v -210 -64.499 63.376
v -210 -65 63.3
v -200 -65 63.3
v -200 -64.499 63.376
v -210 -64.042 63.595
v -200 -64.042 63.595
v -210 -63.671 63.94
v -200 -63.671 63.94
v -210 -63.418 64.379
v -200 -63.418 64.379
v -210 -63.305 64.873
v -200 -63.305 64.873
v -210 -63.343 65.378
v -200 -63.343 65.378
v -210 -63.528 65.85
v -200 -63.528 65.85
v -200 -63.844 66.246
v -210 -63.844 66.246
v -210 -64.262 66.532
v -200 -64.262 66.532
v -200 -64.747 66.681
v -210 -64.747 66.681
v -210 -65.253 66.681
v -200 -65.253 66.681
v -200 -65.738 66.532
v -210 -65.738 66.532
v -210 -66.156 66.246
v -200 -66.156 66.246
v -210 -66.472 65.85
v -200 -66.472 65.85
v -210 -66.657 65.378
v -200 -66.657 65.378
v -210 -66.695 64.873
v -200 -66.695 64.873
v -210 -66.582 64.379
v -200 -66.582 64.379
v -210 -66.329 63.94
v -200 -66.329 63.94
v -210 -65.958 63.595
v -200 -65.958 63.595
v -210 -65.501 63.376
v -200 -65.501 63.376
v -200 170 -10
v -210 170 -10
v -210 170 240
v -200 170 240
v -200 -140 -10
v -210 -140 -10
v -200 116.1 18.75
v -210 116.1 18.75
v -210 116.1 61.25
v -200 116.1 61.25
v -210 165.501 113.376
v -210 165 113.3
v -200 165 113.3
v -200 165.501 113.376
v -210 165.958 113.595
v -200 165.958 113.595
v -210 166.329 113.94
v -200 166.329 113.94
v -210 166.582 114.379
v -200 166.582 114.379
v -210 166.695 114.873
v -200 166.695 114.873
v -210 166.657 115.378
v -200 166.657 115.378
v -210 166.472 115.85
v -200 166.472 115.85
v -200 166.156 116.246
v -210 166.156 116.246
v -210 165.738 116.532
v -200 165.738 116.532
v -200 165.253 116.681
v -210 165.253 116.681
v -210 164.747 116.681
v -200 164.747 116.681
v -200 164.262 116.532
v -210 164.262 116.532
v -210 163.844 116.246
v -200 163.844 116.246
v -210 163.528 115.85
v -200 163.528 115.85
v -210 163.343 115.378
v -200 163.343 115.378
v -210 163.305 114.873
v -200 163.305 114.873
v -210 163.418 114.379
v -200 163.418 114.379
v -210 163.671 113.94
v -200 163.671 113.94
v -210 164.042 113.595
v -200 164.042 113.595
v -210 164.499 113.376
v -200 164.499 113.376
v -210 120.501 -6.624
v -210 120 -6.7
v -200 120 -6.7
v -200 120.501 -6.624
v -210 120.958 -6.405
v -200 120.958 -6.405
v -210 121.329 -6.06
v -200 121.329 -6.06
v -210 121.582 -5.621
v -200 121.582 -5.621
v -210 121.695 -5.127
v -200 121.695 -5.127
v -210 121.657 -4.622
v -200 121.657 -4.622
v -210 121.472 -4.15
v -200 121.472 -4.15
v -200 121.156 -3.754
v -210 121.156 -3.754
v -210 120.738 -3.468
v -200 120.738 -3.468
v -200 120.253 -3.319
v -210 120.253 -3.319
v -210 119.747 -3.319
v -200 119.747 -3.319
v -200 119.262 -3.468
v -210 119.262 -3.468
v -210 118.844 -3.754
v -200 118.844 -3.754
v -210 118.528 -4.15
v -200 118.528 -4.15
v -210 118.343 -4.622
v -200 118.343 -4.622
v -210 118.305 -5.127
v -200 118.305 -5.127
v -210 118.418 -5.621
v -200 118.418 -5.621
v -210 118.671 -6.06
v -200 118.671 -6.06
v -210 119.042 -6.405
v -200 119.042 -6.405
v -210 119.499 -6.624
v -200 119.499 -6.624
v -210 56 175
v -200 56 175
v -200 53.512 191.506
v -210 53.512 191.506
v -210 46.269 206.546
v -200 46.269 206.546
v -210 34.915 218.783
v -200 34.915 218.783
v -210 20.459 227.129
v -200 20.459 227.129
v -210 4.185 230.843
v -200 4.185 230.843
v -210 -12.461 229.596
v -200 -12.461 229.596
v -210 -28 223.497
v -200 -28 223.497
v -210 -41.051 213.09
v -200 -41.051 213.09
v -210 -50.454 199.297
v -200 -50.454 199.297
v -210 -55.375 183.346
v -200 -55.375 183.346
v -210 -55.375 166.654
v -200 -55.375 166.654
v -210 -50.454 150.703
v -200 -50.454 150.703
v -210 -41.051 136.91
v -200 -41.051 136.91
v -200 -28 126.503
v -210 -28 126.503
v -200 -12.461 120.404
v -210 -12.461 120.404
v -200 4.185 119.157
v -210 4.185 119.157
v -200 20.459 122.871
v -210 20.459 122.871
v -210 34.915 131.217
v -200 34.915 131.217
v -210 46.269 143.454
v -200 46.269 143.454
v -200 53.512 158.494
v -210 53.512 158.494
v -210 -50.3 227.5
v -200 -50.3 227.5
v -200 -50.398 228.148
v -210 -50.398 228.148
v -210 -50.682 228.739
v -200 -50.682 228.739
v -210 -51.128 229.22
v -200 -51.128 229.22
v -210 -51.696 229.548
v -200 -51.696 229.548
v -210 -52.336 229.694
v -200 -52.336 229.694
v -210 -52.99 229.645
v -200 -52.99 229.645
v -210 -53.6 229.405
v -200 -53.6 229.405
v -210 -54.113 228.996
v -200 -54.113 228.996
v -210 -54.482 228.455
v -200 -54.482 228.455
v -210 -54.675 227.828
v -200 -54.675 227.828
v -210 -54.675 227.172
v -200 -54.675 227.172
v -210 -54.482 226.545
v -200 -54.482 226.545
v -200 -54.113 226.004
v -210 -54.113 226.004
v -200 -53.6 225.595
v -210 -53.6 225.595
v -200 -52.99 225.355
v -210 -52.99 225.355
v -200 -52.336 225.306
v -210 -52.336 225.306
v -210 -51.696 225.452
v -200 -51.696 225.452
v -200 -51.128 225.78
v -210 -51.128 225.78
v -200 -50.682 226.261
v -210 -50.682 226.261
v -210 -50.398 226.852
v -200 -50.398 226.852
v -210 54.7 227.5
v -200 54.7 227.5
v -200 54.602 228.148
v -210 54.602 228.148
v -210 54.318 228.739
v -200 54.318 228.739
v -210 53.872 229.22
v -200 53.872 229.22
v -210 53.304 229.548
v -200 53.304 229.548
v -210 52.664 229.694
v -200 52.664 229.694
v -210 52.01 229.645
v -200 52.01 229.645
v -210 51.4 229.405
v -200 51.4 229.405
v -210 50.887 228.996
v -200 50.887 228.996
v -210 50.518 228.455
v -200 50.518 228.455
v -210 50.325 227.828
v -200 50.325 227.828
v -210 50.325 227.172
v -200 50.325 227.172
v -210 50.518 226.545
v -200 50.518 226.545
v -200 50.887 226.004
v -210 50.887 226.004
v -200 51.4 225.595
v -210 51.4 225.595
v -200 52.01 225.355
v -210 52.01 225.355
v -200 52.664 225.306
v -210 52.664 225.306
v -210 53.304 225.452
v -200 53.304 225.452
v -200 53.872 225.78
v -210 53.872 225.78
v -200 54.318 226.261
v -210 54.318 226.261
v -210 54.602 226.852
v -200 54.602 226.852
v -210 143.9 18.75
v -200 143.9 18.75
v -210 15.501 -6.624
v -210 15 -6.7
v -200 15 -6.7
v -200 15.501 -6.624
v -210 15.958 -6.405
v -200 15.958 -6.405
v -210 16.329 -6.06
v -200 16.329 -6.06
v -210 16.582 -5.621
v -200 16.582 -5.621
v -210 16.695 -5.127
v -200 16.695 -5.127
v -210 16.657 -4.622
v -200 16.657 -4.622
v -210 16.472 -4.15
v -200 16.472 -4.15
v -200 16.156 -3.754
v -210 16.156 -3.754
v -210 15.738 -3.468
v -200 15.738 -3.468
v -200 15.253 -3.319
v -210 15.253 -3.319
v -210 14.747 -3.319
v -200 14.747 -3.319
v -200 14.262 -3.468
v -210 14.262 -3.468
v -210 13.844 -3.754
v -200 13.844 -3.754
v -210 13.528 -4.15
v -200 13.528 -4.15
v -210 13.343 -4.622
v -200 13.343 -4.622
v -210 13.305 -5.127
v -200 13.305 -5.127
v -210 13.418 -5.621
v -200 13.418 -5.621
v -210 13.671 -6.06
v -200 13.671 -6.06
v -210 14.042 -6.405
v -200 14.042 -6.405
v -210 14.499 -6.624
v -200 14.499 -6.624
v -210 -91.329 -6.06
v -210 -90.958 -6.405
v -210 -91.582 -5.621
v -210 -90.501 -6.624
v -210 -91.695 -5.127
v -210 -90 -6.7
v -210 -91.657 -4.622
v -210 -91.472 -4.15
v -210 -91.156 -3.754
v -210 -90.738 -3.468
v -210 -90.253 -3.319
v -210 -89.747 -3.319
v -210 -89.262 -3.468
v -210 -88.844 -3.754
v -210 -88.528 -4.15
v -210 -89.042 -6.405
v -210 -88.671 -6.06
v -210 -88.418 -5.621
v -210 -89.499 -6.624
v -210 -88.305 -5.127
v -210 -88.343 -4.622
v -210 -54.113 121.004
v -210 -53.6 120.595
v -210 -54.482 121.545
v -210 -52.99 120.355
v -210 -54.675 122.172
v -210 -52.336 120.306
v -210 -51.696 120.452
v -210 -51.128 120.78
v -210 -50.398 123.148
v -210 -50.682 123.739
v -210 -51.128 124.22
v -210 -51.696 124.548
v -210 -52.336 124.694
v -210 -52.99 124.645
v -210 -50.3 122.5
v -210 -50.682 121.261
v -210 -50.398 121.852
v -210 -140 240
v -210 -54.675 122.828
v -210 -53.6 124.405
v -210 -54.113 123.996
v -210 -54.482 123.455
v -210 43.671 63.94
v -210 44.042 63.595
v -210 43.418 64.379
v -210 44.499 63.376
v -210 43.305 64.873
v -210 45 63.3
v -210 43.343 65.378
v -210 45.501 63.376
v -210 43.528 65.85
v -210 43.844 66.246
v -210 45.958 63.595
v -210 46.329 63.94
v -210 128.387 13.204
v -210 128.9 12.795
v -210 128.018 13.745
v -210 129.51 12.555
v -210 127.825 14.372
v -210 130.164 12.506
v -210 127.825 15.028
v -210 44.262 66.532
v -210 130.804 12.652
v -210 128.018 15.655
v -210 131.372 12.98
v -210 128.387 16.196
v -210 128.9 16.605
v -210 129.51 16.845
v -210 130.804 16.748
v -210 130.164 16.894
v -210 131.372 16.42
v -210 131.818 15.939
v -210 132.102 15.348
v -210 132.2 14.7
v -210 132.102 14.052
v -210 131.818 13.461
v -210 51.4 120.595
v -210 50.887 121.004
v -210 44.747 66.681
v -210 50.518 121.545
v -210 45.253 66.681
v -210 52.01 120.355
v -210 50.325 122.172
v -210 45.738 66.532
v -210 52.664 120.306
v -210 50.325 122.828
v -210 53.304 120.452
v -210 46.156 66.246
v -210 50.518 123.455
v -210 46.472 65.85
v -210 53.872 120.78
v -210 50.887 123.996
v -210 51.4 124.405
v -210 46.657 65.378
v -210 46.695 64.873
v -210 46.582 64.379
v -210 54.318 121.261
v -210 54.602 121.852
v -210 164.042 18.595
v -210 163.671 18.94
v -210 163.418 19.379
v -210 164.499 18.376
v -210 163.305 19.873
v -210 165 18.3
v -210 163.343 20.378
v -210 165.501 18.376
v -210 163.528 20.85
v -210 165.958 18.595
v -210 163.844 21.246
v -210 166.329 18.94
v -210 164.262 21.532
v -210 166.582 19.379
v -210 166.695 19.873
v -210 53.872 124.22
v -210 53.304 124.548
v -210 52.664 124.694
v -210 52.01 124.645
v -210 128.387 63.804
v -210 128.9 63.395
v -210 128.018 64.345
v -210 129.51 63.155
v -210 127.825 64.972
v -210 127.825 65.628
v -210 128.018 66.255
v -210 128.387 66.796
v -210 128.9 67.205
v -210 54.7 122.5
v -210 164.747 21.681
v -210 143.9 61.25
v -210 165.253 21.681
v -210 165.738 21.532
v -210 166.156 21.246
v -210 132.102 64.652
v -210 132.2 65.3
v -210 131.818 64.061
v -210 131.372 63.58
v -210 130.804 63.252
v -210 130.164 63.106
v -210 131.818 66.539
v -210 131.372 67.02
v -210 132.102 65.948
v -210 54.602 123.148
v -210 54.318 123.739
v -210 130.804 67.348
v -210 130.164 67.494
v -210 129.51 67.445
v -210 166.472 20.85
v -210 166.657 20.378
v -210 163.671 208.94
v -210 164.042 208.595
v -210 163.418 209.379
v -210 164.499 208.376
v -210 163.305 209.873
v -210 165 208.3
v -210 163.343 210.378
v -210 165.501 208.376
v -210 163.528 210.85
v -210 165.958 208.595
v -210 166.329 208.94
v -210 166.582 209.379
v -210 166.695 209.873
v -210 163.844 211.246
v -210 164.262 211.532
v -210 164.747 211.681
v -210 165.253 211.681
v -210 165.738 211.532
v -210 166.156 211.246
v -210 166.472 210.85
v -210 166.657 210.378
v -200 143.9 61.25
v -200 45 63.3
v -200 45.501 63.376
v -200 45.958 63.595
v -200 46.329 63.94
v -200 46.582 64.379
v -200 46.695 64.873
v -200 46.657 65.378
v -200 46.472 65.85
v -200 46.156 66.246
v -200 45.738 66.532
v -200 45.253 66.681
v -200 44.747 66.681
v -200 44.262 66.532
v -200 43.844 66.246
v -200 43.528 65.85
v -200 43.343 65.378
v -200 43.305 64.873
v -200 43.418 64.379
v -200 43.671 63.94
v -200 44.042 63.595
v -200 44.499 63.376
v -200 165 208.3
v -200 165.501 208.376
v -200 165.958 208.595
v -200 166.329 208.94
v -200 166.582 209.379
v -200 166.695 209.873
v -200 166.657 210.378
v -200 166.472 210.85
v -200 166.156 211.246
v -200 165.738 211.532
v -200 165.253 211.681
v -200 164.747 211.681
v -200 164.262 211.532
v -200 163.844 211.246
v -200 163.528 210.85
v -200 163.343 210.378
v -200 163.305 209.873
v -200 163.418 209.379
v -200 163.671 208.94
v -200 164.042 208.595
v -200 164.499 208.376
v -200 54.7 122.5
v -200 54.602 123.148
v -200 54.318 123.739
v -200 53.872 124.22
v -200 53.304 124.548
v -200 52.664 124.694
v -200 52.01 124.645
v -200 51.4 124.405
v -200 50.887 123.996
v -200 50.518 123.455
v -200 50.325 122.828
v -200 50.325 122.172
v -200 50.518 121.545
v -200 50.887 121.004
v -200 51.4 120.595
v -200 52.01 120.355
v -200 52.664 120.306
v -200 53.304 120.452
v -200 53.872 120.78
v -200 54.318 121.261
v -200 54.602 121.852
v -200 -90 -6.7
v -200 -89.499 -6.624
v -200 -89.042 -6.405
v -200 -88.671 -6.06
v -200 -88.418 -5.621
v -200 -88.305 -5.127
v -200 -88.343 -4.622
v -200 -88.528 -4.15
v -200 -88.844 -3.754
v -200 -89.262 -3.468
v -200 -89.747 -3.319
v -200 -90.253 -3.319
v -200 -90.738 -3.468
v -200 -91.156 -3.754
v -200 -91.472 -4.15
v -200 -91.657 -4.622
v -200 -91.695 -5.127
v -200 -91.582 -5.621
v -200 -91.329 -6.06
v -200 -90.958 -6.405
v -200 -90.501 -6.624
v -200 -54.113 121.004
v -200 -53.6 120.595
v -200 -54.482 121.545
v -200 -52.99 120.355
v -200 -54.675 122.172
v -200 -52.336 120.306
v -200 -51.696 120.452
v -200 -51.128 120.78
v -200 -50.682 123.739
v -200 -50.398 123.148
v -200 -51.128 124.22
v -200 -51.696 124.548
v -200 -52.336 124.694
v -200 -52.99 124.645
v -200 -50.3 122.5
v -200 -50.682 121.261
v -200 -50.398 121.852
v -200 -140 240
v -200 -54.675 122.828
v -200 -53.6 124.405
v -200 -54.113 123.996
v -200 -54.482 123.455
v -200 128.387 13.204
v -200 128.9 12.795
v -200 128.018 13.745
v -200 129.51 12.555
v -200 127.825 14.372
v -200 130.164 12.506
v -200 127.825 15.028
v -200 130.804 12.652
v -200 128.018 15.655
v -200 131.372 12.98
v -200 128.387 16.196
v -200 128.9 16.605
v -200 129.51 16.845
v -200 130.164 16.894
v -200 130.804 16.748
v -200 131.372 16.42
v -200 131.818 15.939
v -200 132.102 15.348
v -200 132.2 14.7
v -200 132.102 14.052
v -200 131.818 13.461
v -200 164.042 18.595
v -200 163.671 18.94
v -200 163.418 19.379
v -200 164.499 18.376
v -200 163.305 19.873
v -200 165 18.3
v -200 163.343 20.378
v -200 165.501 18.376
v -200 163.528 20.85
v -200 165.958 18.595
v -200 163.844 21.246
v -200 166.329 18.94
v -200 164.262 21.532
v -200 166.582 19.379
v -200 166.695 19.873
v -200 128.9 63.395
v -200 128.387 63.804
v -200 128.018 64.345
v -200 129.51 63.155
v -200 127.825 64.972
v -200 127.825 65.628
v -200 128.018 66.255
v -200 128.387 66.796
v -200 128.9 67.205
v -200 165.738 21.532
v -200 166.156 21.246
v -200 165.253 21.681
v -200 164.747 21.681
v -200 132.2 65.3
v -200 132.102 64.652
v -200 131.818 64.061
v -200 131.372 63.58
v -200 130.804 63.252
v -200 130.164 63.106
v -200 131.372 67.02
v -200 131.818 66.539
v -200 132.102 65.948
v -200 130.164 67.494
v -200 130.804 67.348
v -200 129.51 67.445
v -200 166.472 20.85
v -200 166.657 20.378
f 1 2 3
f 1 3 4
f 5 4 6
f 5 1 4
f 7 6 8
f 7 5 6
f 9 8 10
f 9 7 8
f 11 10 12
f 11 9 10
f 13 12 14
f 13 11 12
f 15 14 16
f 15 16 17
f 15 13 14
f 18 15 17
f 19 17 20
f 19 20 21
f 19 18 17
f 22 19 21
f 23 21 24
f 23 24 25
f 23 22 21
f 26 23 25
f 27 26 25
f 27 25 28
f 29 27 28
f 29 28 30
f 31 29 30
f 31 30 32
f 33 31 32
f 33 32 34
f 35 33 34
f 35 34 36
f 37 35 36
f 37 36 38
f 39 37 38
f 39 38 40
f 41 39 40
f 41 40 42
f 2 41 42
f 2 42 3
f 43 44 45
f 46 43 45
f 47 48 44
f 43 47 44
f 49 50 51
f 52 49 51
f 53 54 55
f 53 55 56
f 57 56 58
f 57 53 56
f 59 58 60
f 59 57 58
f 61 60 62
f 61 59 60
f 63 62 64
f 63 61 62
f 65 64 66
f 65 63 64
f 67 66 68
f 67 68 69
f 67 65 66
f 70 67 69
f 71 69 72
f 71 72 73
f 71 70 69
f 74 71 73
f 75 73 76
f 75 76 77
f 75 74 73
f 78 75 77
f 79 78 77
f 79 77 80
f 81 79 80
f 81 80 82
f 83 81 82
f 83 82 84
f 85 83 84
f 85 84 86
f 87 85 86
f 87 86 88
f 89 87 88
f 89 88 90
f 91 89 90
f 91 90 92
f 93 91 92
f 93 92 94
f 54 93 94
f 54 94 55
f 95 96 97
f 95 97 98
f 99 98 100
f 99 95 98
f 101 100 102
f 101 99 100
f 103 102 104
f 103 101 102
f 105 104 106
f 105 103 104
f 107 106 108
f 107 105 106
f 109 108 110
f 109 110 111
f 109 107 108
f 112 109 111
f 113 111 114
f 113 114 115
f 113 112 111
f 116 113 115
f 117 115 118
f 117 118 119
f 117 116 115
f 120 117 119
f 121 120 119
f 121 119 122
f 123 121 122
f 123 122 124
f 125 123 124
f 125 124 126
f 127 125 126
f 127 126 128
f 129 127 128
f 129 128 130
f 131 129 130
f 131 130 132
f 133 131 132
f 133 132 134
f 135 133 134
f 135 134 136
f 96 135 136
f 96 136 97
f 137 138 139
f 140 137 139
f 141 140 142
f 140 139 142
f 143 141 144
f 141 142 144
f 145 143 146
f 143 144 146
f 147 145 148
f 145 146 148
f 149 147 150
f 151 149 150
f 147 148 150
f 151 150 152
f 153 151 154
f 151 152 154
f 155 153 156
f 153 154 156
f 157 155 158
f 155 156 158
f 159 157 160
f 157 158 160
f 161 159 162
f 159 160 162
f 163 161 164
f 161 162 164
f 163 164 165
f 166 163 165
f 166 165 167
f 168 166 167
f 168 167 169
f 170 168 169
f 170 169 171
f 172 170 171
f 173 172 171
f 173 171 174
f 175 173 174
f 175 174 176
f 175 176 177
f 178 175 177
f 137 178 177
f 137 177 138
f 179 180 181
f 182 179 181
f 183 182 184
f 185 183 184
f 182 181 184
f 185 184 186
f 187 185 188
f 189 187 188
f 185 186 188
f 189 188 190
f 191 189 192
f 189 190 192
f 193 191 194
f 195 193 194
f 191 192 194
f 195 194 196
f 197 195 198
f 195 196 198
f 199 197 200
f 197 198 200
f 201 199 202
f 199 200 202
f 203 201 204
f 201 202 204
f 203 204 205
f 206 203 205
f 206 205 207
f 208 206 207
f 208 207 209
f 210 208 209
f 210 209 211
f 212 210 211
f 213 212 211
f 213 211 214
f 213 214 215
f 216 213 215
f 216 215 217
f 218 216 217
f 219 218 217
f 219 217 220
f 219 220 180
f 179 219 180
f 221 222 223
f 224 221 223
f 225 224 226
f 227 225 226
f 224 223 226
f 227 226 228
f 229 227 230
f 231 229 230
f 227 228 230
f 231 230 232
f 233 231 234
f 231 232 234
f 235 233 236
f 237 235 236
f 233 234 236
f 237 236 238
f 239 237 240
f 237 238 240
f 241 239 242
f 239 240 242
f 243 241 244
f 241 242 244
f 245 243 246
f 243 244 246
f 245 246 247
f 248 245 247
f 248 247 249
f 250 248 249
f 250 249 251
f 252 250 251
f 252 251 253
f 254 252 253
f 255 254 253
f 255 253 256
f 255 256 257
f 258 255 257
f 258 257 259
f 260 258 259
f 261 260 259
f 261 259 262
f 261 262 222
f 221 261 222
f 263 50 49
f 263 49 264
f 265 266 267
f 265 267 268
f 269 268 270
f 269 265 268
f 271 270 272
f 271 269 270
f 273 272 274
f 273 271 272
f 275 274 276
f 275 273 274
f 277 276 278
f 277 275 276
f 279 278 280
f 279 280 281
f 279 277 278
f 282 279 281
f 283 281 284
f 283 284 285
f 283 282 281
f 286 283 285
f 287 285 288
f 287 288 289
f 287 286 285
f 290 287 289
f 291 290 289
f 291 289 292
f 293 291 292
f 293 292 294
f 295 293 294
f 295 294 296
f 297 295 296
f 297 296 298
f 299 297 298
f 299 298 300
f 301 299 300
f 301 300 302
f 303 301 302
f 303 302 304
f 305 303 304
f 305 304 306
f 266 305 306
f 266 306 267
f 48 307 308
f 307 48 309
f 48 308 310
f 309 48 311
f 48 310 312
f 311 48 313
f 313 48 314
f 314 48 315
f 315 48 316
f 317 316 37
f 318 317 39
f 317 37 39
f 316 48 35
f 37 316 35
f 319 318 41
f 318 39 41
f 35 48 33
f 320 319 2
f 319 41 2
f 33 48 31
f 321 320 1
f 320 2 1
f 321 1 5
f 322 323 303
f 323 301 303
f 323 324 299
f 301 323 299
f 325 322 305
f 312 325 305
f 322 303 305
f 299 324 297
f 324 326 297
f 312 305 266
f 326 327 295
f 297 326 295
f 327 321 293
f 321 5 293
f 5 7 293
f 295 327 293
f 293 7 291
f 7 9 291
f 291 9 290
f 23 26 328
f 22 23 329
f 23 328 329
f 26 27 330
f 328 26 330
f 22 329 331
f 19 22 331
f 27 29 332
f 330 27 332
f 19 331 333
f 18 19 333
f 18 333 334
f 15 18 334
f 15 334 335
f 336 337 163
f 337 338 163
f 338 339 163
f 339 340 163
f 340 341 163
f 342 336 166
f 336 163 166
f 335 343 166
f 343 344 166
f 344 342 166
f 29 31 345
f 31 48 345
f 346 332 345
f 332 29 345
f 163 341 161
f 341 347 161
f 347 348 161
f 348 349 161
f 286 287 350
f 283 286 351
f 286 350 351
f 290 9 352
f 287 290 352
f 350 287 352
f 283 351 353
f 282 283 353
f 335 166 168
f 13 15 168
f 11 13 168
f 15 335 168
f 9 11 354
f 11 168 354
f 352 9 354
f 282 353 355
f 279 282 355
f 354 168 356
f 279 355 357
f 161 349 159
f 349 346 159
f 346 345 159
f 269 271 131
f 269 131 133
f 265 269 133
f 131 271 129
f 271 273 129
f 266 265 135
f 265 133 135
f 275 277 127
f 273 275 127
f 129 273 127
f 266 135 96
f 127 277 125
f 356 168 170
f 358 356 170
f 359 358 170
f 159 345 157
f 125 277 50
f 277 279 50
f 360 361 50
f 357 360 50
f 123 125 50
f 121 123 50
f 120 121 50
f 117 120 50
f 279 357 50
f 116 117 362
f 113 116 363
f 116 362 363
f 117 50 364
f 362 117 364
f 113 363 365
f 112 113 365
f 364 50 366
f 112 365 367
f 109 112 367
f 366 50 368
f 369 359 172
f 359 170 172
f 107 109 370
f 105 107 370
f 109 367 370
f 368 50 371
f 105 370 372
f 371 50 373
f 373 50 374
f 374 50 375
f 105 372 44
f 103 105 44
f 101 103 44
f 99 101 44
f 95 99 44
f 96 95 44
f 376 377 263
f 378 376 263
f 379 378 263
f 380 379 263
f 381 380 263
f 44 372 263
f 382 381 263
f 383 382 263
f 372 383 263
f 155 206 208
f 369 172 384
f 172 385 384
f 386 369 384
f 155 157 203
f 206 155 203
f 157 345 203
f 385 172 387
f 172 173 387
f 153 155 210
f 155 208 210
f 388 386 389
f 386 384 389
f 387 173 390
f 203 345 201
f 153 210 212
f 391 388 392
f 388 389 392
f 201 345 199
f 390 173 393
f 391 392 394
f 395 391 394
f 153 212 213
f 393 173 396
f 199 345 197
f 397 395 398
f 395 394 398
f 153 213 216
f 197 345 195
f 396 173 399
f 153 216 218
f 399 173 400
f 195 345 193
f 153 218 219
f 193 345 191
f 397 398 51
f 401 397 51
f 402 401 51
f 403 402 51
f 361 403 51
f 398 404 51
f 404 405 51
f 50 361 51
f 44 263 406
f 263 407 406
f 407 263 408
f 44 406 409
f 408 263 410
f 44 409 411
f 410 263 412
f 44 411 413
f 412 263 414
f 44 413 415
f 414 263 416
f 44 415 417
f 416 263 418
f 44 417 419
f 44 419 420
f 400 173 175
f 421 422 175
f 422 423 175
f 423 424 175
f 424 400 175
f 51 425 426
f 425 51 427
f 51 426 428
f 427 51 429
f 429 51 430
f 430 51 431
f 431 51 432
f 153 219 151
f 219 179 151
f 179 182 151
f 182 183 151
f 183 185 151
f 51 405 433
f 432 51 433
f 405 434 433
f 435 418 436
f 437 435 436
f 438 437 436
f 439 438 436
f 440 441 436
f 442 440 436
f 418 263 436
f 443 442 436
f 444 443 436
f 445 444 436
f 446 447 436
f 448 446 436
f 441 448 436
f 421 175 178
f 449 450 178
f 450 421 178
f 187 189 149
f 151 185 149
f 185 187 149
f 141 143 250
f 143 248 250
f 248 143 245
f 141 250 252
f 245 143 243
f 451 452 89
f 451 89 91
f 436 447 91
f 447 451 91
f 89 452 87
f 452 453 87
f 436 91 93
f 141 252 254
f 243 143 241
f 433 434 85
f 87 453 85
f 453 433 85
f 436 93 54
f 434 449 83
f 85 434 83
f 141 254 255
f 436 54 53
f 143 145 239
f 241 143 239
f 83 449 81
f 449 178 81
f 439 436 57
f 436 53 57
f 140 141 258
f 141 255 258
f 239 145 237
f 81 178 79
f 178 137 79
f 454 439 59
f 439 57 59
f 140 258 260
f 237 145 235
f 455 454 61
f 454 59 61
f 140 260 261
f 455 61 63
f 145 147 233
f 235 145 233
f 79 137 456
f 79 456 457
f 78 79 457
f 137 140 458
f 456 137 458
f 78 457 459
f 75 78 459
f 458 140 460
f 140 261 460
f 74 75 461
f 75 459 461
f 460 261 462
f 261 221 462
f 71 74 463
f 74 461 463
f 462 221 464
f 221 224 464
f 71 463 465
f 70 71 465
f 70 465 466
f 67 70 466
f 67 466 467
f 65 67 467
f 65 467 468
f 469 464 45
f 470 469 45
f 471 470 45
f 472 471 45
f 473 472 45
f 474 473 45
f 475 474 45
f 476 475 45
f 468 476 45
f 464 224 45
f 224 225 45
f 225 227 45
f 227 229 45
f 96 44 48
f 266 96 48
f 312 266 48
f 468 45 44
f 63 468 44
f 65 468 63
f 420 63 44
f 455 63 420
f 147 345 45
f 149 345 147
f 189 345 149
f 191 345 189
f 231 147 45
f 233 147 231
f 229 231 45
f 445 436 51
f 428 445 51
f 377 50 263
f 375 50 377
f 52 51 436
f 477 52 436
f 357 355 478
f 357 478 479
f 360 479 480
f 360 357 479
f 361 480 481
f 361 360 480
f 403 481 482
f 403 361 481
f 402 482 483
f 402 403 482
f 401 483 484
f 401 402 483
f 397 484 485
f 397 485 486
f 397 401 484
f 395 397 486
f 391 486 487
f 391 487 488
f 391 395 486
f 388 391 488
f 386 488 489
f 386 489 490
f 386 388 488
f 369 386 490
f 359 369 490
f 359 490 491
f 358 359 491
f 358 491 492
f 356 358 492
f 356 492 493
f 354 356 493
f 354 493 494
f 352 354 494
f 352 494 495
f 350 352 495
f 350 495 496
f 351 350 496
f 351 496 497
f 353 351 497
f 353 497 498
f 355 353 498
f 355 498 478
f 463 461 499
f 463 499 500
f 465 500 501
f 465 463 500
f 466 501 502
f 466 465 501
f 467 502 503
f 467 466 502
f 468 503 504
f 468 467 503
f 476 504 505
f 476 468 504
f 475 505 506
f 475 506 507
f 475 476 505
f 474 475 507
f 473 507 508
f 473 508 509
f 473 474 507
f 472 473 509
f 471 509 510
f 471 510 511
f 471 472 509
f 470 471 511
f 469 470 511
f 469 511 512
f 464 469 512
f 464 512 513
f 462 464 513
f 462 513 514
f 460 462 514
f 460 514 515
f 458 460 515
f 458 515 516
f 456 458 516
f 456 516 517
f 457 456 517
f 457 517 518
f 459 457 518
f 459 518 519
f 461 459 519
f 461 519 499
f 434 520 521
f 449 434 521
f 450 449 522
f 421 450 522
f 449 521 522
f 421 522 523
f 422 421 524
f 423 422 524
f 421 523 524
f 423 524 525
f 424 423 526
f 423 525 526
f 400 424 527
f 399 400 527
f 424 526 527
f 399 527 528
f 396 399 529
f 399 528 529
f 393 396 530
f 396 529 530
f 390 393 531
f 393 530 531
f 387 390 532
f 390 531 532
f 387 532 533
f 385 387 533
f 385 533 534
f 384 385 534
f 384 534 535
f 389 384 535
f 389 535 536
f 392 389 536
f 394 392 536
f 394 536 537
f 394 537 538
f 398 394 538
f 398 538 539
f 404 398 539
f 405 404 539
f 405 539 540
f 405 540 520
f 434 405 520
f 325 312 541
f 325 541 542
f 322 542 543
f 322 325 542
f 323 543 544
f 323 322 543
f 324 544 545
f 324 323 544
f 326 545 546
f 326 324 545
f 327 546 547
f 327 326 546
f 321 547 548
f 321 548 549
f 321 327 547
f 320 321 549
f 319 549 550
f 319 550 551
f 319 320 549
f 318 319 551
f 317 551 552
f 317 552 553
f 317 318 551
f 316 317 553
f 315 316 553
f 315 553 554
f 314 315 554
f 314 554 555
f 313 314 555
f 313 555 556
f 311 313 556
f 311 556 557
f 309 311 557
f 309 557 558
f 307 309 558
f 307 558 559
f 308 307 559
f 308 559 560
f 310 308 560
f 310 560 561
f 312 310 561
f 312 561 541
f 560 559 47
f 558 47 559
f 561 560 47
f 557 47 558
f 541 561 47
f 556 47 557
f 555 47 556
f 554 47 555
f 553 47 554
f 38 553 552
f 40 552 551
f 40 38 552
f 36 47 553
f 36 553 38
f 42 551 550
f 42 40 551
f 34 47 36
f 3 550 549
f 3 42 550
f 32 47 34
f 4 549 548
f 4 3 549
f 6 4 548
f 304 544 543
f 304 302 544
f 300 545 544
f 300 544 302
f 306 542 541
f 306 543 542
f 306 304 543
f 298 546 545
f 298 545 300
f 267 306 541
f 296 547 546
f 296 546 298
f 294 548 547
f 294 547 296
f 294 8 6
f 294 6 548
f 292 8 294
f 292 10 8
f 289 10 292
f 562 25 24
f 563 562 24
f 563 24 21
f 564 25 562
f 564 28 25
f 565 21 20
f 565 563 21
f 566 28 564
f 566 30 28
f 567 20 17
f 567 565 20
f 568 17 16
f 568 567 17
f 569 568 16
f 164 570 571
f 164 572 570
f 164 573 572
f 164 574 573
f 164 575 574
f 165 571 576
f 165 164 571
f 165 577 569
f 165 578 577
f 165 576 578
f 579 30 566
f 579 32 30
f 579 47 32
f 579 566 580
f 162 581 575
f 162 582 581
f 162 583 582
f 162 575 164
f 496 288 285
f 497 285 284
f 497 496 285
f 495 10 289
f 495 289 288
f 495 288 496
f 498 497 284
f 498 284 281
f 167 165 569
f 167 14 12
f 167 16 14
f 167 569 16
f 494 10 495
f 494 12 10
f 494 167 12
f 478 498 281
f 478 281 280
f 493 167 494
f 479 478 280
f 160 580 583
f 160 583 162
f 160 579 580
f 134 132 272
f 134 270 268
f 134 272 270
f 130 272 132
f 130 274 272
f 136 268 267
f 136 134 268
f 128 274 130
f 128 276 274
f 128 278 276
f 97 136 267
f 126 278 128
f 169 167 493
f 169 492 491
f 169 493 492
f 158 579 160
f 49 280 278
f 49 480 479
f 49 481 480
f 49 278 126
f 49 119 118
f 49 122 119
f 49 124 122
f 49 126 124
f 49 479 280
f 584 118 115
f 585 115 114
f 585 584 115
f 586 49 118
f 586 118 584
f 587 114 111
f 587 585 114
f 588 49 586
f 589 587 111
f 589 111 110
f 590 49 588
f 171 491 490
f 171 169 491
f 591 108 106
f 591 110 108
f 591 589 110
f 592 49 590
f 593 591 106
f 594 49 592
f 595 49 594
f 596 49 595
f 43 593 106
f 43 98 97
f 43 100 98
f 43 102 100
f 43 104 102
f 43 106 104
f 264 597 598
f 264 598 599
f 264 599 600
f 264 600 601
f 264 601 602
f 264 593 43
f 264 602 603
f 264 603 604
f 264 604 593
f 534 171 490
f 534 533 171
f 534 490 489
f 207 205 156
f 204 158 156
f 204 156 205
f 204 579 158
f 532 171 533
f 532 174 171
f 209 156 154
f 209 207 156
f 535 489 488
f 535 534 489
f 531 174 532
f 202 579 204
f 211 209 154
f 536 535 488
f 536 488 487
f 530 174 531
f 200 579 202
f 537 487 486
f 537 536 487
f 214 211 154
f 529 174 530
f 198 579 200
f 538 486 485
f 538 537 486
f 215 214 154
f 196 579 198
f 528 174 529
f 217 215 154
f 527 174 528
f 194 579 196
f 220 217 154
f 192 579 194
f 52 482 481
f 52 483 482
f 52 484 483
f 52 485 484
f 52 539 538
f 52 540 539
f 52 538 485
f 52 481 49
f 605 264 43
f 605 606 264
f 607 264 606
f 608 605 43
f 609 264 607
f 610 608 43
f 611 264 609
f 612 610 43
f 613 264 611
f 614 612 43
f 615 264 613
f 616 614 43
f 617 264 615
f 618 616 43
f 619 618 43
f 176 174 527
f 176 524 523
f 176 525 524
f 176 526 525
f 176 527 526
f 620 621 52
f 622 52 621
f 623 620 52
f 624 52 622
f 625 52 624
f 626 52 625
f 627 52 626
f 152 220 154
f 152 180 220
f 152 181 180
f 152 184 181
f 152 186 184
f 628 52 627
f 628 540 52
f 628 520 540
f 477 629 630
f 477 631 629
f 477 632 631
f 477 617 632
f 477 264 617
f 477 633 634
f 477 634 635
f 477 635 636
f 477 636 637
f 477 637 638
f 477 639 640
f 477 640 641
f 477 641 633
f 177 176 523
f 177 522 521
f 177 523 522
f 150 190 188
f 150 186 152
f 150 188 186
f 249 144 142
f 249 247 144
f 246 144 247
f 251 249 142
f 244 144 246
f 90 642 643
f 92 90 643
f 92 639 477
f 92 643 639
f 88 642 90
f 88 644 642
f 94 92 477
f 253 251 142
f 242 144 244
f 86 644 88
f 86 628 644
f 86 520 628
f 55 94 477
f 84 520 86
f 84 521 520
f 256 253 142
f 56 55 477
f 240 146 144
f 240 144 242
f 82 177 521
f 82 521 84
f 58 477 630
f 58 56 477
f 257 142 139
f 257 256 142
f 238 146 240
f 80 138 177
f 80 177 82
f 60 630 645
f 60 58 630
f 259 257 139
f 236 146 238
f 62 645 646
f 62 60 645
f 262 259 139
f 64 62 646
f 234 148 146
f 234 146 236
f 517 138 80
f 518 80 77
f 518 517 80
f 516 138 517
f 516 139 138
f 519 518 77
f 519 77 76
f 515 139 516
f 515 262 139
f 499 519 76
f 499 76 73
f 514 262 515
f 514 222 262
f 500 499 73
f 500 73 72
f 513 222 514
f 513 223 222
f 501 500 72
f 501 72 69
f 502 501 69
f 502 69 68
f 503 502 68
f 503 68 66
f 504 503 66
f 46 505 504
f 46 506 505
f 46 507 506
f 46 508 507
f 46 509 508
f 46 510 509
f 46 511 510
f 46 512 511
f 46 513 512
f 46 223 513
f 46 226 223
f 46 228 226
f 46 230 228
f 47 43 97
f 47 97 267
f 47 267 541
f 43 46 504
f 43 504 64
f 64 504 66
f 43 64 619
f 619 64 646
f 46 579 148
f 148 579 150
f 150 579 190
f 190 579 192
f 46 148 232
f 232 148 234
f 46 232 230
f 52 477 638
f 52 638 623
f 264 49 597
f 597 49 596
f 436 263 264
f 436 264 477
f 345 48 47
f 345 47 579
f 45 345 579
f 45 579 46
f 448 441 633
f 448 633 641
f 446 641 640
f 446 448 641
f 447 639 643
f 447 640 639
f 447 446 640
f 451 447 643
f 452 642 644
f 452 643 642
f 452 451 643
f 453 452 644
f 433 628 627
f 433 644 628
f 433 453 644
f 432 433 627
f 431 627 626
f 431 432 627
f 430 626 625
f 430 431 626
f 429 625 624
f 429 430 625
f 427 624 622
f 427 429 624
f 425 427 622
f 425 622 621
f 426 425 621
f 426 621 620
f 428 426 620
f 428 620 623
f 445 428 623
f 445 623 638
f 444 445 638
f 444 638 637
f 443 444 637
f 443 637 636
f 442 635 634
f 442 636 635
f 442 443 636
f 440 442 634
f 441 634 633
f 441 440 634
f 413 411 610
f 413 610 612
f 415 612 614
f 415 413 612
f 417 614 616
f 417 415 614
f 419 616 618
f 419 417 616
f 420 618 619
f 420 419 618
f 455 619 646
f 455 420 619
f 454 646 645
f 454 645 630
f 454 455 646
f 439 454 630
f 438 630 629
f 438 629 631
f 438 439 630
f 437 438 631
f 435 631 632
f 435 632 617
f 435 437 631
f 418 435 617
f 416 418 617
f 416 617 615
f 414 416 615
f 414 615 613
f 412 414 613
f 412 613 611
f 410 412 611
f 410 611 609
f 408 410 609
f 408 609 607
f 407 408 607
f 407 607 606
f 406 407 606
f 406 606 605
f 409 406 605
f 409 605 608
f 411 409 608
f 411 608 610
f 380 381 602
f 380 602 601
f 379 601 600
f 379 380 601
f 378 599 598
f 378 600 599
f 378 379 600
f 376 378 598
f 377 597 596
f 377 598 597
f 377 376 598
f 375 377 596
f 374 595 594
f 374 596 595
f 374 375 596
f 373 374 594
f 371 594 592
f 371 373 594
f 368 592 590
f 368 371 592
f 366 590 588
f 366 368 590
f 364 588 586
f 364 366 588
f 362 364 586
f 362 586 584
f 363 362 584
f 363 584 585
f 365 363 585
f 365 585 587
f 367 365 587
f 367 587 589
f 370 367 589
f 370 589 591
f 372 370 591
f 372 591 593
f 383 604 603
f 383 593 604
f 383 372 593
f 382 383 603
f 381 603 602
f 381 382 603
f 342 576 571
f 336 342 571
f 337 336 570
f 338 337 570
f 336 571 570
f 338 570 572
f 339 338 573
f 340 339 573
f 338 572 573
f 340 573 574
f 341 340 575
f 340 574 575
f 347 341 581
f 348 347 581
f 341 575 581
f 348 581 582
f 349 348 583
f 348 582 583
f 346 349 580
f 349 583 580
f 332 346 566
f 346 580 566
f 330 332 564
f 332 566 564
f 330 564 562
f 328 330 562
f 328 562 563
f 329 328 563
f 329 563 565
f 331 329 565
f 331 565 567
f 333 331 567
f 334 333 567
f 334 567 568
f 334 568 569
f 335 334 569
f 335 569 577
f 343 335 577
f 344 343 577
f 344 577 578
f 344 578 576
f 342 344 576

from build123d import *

# Parameters (mm, degrees)
CYLINDER033_R           = 1.7
CYLINDER033_DEPTH       = 20
CYLINDER031_R           = 1.7
CYLINDER031_DEPTH       = 20
CYLINDER031_ROLL_ANGLE  = 90
CYLINDER028_R           = 1.7
CYLINDER028_DEPTH       = 20
CYLINDER028_ROLL_ANGLE  = 90
CYLINDER032_R           = 1.7
CYLINDER032_DEPTH       = 20
CYLINDER030_R           = 1.7
CYLINDER030_DEPTH       = 20
CYLINDER030_ROLL_ANGLE  = 90
CYLINDER029_R           = 1.7
CYLINDER029_DEPTH       = 20
CYLINDER024_R           = 1.7
CYLINDER024_DEPTH       = 20
CYLINDER024_PITCH_ANGLE = 90
CYLINDER025_R           = 1.7
CYLINDER025_DEPTH       = 20
CYLINDER025_PITCH_ANGLE = 90
CYLINDER026_R           = 1.7
CYLINDER026_DEPTH       = 20
CYLINDER026_PITCH_ANGLE = 90
CYLINDER027_R           = 1.7
CYLINDER027_DEPTH       = 20
CYLINDER027_PITCH_ANGLE = 90
CYLINDER023_R           = 1.7
CYLINDER023_DEPTH       = 20
CYLINDER023_PITCH_ANGLE = 90
CYLINDER022_R           = 1.7
CYLINDER022_DEPTH       = 20
CYLINDER022_PITCH_ANGLE = 90
CYLINDER020_R           = 1.7
CYLINDER020_DEPTH       = 20
CYLINDER020_PITCH_ANGLE = 90
CYLINDER019_R           = 1.7
CYLINDER019_DEPTH       = 20
CYLINDER019_PITCH_ANGLE = 90
SKETCH018_R             = 2.2
SKETCH018_R_2           = 56
PAD016_DEPTH            = 20
SKETCH012_R             = 2.2
SKETCH012_W             = 27.8
SKETCH012_H             = 42.5
PAD012_DEPTH            = 30
SKETCH006_W             = 310
SKETCH006_H             = 250
PAD006_DEPTH            = 10


with BuildPart() as cylinder033:
    # Cylinder033 → Cylinder033 (new body)
    with BuildSketch(Plane(origin=(-205, 120, 240), x_dir=(1, 0, 0), z_dir=(0, 0, 1))):
        Circle(CYLINDER033_R)
    extrude(amount=CYLINDER033_DEPTH)


with BuildPart() as cylinder031:
    # Cylinder031 → Cylinder031 (new body)
    with BuildSketch(Plane.XY):
        Circle(CYLINDER031_R)
    extrude(amount=CYLINDER031_DEPTH)


with BuildPart() as cylinder031_1:
    # Cylinder031 roll: moved
    add(cylinder031.part.rotate(Axis((0, 0, 0), (1, 0, 0)), CYLINDER031_ROLL_ANGLE))


with BuildPart() as cylinder031_2:
    # Cylinder031 placement: moved
    add(cylinder031_1.part.moved(Location((-205, -140, 210))))


with BuildPart() as cylinder028:
    # Cylinder028 → Cylinder028 (new body)
    with BuildSketch(Plane.XY):
        Circle(CYLINDER028_R)
    extrude(amount=CYLINDER028_DEPTH)


with BuildPart() as cylinder028_1:
    # Cylinder028 roll: moved
    add(cylinder028.part.rotate(Axis((0, 0, 0), (1, 0, 0)), CYLINDER028_ROLL_ANGLE))


with BuildPart() as cylinder028_2:
    # Cylinder028 placement: moved
    add(cylinder028_1.part.moved(Location((-205, -140, 20))))


with BuildPart() as cylinder032:
    # Cylinder032 → Cylinder032 (new body)
    with BuildSketch(Plane(origin=(-205, 15, 240), x_dir=(1, 0, 0), z_dir=(0, 0, 1))):
        Circle(CYLINDER032_R)
    extrude(amount=CYLINDER032_DEPTH)


with BuildPart() as cylinder030:
    # Cylinder030 → Cylinder030 (new body)
    with BuildSketch(Plane.XY):
        Circle(CYLINDER030_R)
    extrude(amount=CYLINDER030_DEPTH)


with BuildPart() as cylinder030_1:
    # Cylinder030 roll: moved
    add(cylinder030.part.rotate(Axis((0, 0, 0), (1, 0, 0)), CYLINDER030_ROLL_ANGLE))


with BuildPart() as cylinder030_2:
    # Cylinder030 placement: moved
    add(cylinder030_1.part.moved(Location((-205, -140, 115))))


with BuildPart() as fusion006:
    # Cylinder029 → Cylinder029 (new body)
    with BuildSketch(Plane(origin=(-205, -90, 240), x_dir=(1, 0, 0), z_dir=(0, 0, 1))):
        Circle(CYLINDER029_R)
    extrude(amount=CYLINDER029_DEPTH)

    # Fusion006: union Cylinder033, Cylinder031, Cylinder028, Cylinder032, Cylinder030
    add(cylinder033.part)
    add(cylinder031_2.part)
    add(cylinder028_2.part)
    add(cylinder032.part)
    add(cylinder030_2.part)


with BuildPart() as cylinder024:
    # Cylinder024 → Cylinder024 (new body)
    with BuildSketch(Plane.XY):
        Circle(CYLINDER024_R)
    extrude(amount=CYLINDER024_DEPTH)


with BuildPart() as cylinder024_1:
    # Cylinder024 pitch: moved
    add(cylinder024.part.rotate(Axis((0, 0, 0), (0, 1, 0)), CYLINDER024_PITCH_ANGLE))


with BuildPart() as cylinder024_2:
    # Cylinder024 placement: moved
    add(cylinder024_1.part.moved(Location((-220, 120, -5))))


with BuildPart() as cylinder025:
    # Cylinder025 → Cylinder025 (new body)
    with BuildSketch(Plane.XY):
        Circle(CYLINDER025_R)
    extrude(amount=CYLINDER025_DEPTH)


with BuildPart() as cylinder025_1:
    # Cylinder025 pitch: moved
    add(cylinder025.part.rotate(Axis((0, 0, 0), (0, 1, 0)), CYLINDER025_PITCH_ANGLE))


with BuildPart() as cylinder025_2:
    # Cylinder025 placement: moved
    add(cylinder025_1.part.moved(Location((-220, 165, 20))))


with BuildPart() as cylinder026:
    # Cylinder026 → Cylinder026 (new body)
    with BuildSketch(Plane.XY):
        Circle(CYLINDER026_R)
    extrude(amount=CYLINDER026_DEPTH)


with BuildPart() as cylinder026_1:
    # Cylinder026 pitch: moved
    add(cylinder026.part.rotate(Axis((0, 0, 0), (0, 1, 0)), CYLINDER026_PITCH_ANGLE))


with BuildPart() as cylinder026_2:
    # Cylinder026 placement: moved
    add(cylinder026_1.part.moved(Location((-220, 165, 115))))


with BuildPart() as cylinder027:
    # Cylinder027 → Cylinder027 (new body)
    with BuildSketch(Plane.XY):
        Circle(CYLINDER027_R)
    extrude(amount=CYLINDER027_DEPTH)


with BuildPart() as cylinder027_1:
    # Cylinder027 pitch: moved
    add(cylinder027.part.rotate(Axis((0, 0, 0), (0, 1, 0)), CYLINDER027_PITCH_ANGLE))


with BuildPart() as cylinder027_2:
    # Cylinder027 placement: moved
    add(cylinder027_1.part.moved(Location((-220, 165, 210))))


with BuildPart() as cylinder023:
    # Cylinder023 → Cylinder023 (new body)
    with BuildSketch(Plane.XY):
        Circle(CYLINDER023_R)
    extrude(amount=CYLINDER023_DEPTH)


with BuildPart() as cylinder023_1:
    # Cylinder023 pitch: moved
    add(cylinder023.part.rotate(Axis((0, 0, 0), (0, 1, 0)), CYLINDER023_PITCH_ANGLE))


with BuildPart() as cylinder023_2:
    # Cylinder023 placement: moved
    add(cylinder023_1.part.moved(Location((-220, 15, -5))))


with BuildPart() as fusion007:
    # Cylinder022 → Cylinder022 (new body)
    with BuildSketch(Plane.XY):
        Circle(CYLINDER022_R)
    extrude(amount=CYLINDER022_DEPTH)


with BuildPart() as fusion007_1:
    # Cylinder022 pitch: moved
    add(fusion007.part.rotate(Axis((0, 0, 0), (0, 1, 0)), CYLINDER022_PITCH_ANGLE))


with BuildPart() as fusion007_2:
    # Cylinder022 placement: moved
    add(fusion007_1.part.moved(Location((-220, -90, -5))))

    # Fusion007: union Cylinder024, Cylinder025, Cylinder026, Cylinder027, Cylinder023
    add(cylinder024_2.part)
    add(cylinder025_2.part)
    add(cylinder026_2.part)
    add(cylinder027_2.part)
    add(cylinder023_2.part)


with BuildPart() as cylinder020:
    # Cylinder020 → Cylinder020 (new body)
    with BuildSketch(Plane.XY):
        Circle(CYLINDER020_R)
    extrude(amount=CYLINDER020_DEPTH)


with BuildPart() as cylinder020_1:
    # Cylinder020 pitch: moved
    add(cylinder020.part.rotate(Axis((0, 0, 0), (0, 1, 0)), CYLINDER020_PITCH_ANGLE))


with BuildPart() as cylinder020_2:
    # Cylinder020 placement: moved
    add(cylinder020_1.part.moved(Location((-220, 45, 65))))


with BuildPart() as fusion009:
    # Cylinder019 → Cylinder019 (new body)
    with BuildSketch(Plane.XY):
        Circle(CYLINDER019_R)
    extrude(amount=CYLINDER019_DEPTH)


with BuildPart() as fusion009_1:
    # Cylinder019 pitch: moved
    add(fusion009.part.rotate(Axis((0, 0, 0), (0, 1, 0)), CYLINDER019_PITCH_ANGLE))


with BuildPart() as fusion009_2:
    # Cylinder019 placement: moved
    add(fusion009_1.part.moved(Location((-220, -65, 65))))

    # Fusion008: union Cylinder020
    add(cylinder020_2.part)

    # Fusion009: union Fusion006, Fusion007
    add(fusion006.part)
    add(fusion007_2.part)


with BuildPart() as pad016:
    # Sketch018 → Pad016 (new body)
    with BuildSketch(Plane(origin=(-200, 0, 175), x_dir=(0, 1, 0), z_dir=(1, 0, 0))):
        with Locations((-52.5, 52.5)):
            Circle(SKETCH018_R)
        with Locations((52.5, 52.5)):
            Circle(SKETCH018_R)
        with Locations((-52.5, -52.5)):
            Circle(SKETCH018_R)
        with Locations((52.5, -52.5)):
            Circle(SKETCH018_R)
        Circle(SKETCH018_R_2)
    extrude(amount=-PAD016_DEPTH)


with BuildPart() as pad012:
    # Sketch012 → Pad012 (new body)
    with BuildSketch(Plane(origin=(-213, 130, 40), x_dir=(0, 1, 0), z_dir=(1, 0, 0))):
        with Locations((0, 25.3)):
            Circle(SKETCH012_R)
        with Locations((0, -25.3)):
            Circle(SKETCH012_R)
        Rectangle(SKETCH012_W, SKETCH012_H)
    extrude(amount=PAD012_DEPTH)


with BuildPart() as cut012:
    # Sketch006 → Pad006 (new body)
    with BuildSketch(Plane.YZ.offset(-210)):
        with Locations((15, 115)):
            Rectangle(SKETCH006_W, SKETCH006_H)
    extrude(amount=PAD006_DEPTH)

    # Cut004: cut Pad012
    add(pad012.part, mode=Mode.SUBTRACT)

    # Cut011: cut Pad016
    add(pad016.part, mode=Mode.SUBTRACT)

    # Cut012: cut Fusion009
    add(fusion009_2.part, mode=Mode.SUBTRACT)


solid = cut012.part
